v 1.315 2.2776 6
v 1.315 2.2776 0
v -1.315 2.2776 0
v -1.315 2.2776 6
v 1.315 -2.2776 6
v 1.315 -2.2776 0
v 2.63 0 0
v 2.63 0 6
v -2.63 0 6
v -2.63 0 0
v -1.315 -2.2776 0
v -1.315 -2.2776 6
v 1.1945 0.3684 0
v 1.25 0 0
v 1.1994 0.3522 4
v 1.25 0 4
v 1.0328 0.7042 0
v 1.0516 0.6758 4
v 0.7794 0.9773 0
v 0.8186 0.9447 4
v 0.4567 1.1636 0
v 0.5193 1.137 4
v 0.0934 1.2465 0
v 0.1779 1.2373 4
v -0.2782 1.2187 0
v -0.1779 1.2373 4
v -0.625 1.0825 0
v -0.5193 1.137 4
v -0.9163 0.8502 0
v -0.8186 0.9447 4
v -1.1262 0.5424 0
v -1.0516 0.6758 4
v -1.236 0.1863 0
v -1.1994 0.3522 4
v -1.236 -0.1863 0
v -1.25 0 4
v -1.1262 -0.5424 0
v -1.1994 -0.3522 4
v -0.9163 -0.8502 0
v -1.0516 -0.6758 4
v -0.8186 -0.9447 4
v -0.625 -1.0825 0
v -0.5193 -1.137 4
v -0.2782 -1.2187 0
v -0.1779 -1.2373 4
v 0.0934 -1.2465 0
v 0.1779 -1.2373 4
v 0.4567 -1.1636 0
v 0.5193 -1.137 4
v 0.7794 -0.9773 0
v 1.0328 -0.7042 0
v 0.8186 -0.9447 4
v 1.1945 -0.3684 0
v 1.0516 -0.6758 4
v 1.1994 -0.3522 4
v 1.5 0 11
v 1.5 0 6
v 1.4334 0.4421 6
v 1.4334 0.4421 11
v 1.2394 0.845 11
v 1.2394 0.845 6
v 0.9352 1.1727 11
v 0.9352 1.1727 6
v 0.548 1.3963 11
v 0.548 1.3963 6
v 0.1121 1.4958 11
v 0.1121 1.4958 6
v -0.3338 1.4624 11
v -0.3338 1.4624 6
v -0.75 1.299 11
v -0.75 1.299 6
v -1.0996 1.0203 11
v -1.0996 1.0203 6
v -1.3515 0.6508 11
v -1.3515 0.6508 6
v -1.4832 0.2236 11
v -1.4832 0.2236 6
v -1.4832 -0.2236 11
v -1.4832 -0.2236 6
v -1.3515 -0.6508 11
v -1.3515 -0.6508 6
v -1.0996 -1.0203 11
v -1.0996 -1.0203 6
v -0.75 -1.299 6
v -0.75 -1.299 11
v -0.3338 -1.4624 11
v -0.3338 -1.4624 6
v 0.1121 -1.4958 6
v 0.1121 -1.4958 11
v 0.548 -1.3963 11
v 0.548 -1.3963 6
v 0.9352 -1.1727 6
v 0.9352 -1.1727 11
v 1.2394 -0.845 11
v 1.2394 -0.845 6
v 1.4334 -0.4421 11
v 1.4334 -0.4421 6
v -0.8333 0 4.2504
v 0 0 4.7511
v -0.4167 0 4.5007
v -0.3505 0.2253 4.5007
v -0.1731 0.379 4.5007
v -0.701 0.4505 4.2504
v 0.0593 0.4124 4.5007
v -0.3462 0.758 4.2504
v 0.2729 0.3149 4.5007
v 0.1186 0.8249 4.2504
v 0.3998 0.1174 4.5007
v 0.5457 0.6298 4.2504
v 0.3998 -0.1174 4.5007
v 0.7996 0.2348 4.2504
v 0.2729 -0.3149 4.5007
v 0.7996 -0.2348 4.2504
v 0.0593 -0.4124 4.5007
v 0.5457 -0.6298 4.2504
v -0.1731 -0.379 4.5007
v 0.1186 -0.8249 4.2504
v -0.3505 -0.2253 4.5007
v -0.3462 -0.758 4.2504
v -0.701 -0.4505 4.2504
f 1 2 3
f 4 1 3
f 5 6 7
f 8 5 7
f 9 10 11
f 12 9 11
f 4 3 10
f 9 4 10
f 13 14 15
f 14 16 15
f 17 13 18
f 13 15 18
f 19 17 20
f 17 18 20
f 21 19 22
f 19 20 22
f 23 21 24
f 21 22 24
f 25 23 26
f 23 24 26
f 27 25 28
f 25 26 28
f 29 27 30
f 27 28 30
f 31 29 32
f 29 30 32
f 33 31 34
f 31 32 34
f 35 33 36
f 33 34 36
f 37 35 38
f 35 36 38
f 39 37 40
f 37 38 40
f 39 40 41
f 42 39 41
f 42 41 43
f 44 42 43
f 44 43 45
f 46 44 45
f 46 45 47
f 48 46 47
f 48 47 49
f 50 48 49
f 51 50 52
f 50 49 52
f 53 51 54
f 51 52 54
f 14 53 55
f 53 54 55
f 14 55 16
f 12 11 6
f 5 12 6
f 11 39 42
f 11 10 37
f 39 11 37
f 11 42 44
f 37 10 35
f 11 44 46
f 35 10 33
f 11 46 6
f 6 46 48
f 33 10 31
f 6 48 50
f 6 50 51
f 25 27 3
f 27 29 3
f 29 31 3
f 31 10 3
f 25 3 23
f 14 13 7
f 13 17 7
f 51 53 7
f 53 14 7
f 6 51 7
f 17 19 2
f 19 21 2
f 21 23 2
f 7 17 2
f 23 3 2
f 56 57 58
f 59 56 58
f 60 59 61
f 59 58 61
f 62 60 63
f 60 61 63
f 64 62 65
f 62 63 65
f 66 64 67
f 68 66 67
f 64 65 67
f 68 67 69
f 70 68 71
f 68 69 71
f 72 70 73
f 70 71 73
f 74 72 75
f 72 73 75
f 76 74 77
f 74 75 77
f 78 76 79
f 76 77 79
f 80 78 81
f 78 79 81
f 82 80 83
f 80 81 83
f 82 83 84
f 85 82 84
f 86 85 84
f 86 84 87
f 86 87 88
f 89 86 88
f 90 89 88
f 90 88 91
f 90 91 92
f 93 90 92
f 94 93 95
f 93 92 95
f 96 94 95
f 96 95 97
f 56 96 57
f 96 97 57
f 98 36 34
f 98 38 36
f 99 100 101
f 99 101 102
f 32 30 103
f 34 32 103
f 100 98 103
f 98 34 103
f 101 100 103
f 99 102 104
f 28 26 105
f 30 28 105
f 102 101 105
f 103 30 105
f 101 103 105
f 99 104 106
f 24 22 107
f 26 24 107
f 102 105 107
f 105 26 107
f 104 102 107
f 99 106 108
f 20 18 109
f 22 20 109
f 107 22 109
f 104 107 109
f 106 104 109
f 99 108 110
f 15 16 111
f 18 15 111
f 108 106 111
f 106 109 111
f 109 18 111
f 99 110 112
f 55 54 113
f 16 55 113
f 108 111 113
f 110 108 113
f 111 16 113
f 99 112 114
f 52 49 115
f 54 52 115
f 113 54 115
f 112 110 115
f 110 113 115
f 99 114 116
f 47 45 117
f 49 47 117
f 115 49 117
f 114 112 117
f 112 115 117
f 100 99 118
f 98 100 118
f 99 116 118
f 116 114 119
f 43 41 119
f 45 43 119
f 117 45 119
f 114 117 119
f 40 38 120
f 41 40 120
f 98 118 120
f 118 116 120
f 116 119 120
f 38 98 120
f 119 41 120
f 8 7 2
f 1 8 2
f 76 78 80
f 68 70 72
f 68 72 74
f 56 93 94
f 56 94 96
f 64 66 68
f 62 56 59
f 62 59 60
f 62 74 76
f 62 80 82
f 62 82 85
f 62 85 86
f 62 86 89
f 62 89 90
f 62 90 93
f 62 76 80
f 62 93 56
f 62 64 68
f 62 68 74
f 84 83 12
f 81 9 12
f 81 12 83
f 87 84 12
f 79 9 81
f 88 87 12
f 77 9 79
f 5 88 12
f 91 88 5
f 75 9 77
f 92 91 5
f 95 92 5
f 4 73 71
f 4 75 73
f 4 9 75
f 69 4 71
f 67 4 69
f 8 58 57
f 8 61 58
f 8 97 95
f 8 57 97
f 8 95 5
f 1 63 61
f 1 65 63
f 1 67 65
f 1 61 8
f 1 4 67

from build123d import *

# Parameters (mm, degrees)
EXTRUDE_1_DEPTH = 6
M3X0_5_1_D      = 2.5
M3X0_5_1_DEPTH  = 4
M3X0_5_1_TIP    = 0.751075774
SKETCH_5_R      = 1.5
EXTRUDE_2_DEPTH = 5


with BuildPart() as part:
    # 草圖1 → 填料-伸長1 (new body)
    with BuildSketch(Plane.XY):
        Polygon((2.63, 0), (1.315, 2.277646812), (-1.315, 2.277646812), (-2.63, 0), (-1.315, -2.277646812), (1.315, -2.277646812), align=None)
    extrude(amount=EXTRUDE_1_DEPTH)

    # M3x0.5 螺紋孔1
    with Locations(Plane(origin=(0, 0, 0), x_dir=(-1, 0, 0), z_dir=(0, 0, -1))):
        with Locations((0, 0)):
            Hole(M3X0_5_1_D / 2, depth=M3X0_5_1_DEPTH)
            with Locations((0, 0, -(M3X0_5_1_DEPTH + M3X0_5_1_TIP / 2))):  # 118° drill point
                Cone(0, M3X0_5_1_D / 2, M3X0_5_1_TIP, mode=Mode.SUBTRACT)

    # 草圖5 → 填料-伸長2 (add)
    with BuildSketch(Plane.XY.offset(6)):
        Circle(SKETCH_5_R)
    extrude(amount=EXTRUDE_2_DEPTH)


solid = part.part
